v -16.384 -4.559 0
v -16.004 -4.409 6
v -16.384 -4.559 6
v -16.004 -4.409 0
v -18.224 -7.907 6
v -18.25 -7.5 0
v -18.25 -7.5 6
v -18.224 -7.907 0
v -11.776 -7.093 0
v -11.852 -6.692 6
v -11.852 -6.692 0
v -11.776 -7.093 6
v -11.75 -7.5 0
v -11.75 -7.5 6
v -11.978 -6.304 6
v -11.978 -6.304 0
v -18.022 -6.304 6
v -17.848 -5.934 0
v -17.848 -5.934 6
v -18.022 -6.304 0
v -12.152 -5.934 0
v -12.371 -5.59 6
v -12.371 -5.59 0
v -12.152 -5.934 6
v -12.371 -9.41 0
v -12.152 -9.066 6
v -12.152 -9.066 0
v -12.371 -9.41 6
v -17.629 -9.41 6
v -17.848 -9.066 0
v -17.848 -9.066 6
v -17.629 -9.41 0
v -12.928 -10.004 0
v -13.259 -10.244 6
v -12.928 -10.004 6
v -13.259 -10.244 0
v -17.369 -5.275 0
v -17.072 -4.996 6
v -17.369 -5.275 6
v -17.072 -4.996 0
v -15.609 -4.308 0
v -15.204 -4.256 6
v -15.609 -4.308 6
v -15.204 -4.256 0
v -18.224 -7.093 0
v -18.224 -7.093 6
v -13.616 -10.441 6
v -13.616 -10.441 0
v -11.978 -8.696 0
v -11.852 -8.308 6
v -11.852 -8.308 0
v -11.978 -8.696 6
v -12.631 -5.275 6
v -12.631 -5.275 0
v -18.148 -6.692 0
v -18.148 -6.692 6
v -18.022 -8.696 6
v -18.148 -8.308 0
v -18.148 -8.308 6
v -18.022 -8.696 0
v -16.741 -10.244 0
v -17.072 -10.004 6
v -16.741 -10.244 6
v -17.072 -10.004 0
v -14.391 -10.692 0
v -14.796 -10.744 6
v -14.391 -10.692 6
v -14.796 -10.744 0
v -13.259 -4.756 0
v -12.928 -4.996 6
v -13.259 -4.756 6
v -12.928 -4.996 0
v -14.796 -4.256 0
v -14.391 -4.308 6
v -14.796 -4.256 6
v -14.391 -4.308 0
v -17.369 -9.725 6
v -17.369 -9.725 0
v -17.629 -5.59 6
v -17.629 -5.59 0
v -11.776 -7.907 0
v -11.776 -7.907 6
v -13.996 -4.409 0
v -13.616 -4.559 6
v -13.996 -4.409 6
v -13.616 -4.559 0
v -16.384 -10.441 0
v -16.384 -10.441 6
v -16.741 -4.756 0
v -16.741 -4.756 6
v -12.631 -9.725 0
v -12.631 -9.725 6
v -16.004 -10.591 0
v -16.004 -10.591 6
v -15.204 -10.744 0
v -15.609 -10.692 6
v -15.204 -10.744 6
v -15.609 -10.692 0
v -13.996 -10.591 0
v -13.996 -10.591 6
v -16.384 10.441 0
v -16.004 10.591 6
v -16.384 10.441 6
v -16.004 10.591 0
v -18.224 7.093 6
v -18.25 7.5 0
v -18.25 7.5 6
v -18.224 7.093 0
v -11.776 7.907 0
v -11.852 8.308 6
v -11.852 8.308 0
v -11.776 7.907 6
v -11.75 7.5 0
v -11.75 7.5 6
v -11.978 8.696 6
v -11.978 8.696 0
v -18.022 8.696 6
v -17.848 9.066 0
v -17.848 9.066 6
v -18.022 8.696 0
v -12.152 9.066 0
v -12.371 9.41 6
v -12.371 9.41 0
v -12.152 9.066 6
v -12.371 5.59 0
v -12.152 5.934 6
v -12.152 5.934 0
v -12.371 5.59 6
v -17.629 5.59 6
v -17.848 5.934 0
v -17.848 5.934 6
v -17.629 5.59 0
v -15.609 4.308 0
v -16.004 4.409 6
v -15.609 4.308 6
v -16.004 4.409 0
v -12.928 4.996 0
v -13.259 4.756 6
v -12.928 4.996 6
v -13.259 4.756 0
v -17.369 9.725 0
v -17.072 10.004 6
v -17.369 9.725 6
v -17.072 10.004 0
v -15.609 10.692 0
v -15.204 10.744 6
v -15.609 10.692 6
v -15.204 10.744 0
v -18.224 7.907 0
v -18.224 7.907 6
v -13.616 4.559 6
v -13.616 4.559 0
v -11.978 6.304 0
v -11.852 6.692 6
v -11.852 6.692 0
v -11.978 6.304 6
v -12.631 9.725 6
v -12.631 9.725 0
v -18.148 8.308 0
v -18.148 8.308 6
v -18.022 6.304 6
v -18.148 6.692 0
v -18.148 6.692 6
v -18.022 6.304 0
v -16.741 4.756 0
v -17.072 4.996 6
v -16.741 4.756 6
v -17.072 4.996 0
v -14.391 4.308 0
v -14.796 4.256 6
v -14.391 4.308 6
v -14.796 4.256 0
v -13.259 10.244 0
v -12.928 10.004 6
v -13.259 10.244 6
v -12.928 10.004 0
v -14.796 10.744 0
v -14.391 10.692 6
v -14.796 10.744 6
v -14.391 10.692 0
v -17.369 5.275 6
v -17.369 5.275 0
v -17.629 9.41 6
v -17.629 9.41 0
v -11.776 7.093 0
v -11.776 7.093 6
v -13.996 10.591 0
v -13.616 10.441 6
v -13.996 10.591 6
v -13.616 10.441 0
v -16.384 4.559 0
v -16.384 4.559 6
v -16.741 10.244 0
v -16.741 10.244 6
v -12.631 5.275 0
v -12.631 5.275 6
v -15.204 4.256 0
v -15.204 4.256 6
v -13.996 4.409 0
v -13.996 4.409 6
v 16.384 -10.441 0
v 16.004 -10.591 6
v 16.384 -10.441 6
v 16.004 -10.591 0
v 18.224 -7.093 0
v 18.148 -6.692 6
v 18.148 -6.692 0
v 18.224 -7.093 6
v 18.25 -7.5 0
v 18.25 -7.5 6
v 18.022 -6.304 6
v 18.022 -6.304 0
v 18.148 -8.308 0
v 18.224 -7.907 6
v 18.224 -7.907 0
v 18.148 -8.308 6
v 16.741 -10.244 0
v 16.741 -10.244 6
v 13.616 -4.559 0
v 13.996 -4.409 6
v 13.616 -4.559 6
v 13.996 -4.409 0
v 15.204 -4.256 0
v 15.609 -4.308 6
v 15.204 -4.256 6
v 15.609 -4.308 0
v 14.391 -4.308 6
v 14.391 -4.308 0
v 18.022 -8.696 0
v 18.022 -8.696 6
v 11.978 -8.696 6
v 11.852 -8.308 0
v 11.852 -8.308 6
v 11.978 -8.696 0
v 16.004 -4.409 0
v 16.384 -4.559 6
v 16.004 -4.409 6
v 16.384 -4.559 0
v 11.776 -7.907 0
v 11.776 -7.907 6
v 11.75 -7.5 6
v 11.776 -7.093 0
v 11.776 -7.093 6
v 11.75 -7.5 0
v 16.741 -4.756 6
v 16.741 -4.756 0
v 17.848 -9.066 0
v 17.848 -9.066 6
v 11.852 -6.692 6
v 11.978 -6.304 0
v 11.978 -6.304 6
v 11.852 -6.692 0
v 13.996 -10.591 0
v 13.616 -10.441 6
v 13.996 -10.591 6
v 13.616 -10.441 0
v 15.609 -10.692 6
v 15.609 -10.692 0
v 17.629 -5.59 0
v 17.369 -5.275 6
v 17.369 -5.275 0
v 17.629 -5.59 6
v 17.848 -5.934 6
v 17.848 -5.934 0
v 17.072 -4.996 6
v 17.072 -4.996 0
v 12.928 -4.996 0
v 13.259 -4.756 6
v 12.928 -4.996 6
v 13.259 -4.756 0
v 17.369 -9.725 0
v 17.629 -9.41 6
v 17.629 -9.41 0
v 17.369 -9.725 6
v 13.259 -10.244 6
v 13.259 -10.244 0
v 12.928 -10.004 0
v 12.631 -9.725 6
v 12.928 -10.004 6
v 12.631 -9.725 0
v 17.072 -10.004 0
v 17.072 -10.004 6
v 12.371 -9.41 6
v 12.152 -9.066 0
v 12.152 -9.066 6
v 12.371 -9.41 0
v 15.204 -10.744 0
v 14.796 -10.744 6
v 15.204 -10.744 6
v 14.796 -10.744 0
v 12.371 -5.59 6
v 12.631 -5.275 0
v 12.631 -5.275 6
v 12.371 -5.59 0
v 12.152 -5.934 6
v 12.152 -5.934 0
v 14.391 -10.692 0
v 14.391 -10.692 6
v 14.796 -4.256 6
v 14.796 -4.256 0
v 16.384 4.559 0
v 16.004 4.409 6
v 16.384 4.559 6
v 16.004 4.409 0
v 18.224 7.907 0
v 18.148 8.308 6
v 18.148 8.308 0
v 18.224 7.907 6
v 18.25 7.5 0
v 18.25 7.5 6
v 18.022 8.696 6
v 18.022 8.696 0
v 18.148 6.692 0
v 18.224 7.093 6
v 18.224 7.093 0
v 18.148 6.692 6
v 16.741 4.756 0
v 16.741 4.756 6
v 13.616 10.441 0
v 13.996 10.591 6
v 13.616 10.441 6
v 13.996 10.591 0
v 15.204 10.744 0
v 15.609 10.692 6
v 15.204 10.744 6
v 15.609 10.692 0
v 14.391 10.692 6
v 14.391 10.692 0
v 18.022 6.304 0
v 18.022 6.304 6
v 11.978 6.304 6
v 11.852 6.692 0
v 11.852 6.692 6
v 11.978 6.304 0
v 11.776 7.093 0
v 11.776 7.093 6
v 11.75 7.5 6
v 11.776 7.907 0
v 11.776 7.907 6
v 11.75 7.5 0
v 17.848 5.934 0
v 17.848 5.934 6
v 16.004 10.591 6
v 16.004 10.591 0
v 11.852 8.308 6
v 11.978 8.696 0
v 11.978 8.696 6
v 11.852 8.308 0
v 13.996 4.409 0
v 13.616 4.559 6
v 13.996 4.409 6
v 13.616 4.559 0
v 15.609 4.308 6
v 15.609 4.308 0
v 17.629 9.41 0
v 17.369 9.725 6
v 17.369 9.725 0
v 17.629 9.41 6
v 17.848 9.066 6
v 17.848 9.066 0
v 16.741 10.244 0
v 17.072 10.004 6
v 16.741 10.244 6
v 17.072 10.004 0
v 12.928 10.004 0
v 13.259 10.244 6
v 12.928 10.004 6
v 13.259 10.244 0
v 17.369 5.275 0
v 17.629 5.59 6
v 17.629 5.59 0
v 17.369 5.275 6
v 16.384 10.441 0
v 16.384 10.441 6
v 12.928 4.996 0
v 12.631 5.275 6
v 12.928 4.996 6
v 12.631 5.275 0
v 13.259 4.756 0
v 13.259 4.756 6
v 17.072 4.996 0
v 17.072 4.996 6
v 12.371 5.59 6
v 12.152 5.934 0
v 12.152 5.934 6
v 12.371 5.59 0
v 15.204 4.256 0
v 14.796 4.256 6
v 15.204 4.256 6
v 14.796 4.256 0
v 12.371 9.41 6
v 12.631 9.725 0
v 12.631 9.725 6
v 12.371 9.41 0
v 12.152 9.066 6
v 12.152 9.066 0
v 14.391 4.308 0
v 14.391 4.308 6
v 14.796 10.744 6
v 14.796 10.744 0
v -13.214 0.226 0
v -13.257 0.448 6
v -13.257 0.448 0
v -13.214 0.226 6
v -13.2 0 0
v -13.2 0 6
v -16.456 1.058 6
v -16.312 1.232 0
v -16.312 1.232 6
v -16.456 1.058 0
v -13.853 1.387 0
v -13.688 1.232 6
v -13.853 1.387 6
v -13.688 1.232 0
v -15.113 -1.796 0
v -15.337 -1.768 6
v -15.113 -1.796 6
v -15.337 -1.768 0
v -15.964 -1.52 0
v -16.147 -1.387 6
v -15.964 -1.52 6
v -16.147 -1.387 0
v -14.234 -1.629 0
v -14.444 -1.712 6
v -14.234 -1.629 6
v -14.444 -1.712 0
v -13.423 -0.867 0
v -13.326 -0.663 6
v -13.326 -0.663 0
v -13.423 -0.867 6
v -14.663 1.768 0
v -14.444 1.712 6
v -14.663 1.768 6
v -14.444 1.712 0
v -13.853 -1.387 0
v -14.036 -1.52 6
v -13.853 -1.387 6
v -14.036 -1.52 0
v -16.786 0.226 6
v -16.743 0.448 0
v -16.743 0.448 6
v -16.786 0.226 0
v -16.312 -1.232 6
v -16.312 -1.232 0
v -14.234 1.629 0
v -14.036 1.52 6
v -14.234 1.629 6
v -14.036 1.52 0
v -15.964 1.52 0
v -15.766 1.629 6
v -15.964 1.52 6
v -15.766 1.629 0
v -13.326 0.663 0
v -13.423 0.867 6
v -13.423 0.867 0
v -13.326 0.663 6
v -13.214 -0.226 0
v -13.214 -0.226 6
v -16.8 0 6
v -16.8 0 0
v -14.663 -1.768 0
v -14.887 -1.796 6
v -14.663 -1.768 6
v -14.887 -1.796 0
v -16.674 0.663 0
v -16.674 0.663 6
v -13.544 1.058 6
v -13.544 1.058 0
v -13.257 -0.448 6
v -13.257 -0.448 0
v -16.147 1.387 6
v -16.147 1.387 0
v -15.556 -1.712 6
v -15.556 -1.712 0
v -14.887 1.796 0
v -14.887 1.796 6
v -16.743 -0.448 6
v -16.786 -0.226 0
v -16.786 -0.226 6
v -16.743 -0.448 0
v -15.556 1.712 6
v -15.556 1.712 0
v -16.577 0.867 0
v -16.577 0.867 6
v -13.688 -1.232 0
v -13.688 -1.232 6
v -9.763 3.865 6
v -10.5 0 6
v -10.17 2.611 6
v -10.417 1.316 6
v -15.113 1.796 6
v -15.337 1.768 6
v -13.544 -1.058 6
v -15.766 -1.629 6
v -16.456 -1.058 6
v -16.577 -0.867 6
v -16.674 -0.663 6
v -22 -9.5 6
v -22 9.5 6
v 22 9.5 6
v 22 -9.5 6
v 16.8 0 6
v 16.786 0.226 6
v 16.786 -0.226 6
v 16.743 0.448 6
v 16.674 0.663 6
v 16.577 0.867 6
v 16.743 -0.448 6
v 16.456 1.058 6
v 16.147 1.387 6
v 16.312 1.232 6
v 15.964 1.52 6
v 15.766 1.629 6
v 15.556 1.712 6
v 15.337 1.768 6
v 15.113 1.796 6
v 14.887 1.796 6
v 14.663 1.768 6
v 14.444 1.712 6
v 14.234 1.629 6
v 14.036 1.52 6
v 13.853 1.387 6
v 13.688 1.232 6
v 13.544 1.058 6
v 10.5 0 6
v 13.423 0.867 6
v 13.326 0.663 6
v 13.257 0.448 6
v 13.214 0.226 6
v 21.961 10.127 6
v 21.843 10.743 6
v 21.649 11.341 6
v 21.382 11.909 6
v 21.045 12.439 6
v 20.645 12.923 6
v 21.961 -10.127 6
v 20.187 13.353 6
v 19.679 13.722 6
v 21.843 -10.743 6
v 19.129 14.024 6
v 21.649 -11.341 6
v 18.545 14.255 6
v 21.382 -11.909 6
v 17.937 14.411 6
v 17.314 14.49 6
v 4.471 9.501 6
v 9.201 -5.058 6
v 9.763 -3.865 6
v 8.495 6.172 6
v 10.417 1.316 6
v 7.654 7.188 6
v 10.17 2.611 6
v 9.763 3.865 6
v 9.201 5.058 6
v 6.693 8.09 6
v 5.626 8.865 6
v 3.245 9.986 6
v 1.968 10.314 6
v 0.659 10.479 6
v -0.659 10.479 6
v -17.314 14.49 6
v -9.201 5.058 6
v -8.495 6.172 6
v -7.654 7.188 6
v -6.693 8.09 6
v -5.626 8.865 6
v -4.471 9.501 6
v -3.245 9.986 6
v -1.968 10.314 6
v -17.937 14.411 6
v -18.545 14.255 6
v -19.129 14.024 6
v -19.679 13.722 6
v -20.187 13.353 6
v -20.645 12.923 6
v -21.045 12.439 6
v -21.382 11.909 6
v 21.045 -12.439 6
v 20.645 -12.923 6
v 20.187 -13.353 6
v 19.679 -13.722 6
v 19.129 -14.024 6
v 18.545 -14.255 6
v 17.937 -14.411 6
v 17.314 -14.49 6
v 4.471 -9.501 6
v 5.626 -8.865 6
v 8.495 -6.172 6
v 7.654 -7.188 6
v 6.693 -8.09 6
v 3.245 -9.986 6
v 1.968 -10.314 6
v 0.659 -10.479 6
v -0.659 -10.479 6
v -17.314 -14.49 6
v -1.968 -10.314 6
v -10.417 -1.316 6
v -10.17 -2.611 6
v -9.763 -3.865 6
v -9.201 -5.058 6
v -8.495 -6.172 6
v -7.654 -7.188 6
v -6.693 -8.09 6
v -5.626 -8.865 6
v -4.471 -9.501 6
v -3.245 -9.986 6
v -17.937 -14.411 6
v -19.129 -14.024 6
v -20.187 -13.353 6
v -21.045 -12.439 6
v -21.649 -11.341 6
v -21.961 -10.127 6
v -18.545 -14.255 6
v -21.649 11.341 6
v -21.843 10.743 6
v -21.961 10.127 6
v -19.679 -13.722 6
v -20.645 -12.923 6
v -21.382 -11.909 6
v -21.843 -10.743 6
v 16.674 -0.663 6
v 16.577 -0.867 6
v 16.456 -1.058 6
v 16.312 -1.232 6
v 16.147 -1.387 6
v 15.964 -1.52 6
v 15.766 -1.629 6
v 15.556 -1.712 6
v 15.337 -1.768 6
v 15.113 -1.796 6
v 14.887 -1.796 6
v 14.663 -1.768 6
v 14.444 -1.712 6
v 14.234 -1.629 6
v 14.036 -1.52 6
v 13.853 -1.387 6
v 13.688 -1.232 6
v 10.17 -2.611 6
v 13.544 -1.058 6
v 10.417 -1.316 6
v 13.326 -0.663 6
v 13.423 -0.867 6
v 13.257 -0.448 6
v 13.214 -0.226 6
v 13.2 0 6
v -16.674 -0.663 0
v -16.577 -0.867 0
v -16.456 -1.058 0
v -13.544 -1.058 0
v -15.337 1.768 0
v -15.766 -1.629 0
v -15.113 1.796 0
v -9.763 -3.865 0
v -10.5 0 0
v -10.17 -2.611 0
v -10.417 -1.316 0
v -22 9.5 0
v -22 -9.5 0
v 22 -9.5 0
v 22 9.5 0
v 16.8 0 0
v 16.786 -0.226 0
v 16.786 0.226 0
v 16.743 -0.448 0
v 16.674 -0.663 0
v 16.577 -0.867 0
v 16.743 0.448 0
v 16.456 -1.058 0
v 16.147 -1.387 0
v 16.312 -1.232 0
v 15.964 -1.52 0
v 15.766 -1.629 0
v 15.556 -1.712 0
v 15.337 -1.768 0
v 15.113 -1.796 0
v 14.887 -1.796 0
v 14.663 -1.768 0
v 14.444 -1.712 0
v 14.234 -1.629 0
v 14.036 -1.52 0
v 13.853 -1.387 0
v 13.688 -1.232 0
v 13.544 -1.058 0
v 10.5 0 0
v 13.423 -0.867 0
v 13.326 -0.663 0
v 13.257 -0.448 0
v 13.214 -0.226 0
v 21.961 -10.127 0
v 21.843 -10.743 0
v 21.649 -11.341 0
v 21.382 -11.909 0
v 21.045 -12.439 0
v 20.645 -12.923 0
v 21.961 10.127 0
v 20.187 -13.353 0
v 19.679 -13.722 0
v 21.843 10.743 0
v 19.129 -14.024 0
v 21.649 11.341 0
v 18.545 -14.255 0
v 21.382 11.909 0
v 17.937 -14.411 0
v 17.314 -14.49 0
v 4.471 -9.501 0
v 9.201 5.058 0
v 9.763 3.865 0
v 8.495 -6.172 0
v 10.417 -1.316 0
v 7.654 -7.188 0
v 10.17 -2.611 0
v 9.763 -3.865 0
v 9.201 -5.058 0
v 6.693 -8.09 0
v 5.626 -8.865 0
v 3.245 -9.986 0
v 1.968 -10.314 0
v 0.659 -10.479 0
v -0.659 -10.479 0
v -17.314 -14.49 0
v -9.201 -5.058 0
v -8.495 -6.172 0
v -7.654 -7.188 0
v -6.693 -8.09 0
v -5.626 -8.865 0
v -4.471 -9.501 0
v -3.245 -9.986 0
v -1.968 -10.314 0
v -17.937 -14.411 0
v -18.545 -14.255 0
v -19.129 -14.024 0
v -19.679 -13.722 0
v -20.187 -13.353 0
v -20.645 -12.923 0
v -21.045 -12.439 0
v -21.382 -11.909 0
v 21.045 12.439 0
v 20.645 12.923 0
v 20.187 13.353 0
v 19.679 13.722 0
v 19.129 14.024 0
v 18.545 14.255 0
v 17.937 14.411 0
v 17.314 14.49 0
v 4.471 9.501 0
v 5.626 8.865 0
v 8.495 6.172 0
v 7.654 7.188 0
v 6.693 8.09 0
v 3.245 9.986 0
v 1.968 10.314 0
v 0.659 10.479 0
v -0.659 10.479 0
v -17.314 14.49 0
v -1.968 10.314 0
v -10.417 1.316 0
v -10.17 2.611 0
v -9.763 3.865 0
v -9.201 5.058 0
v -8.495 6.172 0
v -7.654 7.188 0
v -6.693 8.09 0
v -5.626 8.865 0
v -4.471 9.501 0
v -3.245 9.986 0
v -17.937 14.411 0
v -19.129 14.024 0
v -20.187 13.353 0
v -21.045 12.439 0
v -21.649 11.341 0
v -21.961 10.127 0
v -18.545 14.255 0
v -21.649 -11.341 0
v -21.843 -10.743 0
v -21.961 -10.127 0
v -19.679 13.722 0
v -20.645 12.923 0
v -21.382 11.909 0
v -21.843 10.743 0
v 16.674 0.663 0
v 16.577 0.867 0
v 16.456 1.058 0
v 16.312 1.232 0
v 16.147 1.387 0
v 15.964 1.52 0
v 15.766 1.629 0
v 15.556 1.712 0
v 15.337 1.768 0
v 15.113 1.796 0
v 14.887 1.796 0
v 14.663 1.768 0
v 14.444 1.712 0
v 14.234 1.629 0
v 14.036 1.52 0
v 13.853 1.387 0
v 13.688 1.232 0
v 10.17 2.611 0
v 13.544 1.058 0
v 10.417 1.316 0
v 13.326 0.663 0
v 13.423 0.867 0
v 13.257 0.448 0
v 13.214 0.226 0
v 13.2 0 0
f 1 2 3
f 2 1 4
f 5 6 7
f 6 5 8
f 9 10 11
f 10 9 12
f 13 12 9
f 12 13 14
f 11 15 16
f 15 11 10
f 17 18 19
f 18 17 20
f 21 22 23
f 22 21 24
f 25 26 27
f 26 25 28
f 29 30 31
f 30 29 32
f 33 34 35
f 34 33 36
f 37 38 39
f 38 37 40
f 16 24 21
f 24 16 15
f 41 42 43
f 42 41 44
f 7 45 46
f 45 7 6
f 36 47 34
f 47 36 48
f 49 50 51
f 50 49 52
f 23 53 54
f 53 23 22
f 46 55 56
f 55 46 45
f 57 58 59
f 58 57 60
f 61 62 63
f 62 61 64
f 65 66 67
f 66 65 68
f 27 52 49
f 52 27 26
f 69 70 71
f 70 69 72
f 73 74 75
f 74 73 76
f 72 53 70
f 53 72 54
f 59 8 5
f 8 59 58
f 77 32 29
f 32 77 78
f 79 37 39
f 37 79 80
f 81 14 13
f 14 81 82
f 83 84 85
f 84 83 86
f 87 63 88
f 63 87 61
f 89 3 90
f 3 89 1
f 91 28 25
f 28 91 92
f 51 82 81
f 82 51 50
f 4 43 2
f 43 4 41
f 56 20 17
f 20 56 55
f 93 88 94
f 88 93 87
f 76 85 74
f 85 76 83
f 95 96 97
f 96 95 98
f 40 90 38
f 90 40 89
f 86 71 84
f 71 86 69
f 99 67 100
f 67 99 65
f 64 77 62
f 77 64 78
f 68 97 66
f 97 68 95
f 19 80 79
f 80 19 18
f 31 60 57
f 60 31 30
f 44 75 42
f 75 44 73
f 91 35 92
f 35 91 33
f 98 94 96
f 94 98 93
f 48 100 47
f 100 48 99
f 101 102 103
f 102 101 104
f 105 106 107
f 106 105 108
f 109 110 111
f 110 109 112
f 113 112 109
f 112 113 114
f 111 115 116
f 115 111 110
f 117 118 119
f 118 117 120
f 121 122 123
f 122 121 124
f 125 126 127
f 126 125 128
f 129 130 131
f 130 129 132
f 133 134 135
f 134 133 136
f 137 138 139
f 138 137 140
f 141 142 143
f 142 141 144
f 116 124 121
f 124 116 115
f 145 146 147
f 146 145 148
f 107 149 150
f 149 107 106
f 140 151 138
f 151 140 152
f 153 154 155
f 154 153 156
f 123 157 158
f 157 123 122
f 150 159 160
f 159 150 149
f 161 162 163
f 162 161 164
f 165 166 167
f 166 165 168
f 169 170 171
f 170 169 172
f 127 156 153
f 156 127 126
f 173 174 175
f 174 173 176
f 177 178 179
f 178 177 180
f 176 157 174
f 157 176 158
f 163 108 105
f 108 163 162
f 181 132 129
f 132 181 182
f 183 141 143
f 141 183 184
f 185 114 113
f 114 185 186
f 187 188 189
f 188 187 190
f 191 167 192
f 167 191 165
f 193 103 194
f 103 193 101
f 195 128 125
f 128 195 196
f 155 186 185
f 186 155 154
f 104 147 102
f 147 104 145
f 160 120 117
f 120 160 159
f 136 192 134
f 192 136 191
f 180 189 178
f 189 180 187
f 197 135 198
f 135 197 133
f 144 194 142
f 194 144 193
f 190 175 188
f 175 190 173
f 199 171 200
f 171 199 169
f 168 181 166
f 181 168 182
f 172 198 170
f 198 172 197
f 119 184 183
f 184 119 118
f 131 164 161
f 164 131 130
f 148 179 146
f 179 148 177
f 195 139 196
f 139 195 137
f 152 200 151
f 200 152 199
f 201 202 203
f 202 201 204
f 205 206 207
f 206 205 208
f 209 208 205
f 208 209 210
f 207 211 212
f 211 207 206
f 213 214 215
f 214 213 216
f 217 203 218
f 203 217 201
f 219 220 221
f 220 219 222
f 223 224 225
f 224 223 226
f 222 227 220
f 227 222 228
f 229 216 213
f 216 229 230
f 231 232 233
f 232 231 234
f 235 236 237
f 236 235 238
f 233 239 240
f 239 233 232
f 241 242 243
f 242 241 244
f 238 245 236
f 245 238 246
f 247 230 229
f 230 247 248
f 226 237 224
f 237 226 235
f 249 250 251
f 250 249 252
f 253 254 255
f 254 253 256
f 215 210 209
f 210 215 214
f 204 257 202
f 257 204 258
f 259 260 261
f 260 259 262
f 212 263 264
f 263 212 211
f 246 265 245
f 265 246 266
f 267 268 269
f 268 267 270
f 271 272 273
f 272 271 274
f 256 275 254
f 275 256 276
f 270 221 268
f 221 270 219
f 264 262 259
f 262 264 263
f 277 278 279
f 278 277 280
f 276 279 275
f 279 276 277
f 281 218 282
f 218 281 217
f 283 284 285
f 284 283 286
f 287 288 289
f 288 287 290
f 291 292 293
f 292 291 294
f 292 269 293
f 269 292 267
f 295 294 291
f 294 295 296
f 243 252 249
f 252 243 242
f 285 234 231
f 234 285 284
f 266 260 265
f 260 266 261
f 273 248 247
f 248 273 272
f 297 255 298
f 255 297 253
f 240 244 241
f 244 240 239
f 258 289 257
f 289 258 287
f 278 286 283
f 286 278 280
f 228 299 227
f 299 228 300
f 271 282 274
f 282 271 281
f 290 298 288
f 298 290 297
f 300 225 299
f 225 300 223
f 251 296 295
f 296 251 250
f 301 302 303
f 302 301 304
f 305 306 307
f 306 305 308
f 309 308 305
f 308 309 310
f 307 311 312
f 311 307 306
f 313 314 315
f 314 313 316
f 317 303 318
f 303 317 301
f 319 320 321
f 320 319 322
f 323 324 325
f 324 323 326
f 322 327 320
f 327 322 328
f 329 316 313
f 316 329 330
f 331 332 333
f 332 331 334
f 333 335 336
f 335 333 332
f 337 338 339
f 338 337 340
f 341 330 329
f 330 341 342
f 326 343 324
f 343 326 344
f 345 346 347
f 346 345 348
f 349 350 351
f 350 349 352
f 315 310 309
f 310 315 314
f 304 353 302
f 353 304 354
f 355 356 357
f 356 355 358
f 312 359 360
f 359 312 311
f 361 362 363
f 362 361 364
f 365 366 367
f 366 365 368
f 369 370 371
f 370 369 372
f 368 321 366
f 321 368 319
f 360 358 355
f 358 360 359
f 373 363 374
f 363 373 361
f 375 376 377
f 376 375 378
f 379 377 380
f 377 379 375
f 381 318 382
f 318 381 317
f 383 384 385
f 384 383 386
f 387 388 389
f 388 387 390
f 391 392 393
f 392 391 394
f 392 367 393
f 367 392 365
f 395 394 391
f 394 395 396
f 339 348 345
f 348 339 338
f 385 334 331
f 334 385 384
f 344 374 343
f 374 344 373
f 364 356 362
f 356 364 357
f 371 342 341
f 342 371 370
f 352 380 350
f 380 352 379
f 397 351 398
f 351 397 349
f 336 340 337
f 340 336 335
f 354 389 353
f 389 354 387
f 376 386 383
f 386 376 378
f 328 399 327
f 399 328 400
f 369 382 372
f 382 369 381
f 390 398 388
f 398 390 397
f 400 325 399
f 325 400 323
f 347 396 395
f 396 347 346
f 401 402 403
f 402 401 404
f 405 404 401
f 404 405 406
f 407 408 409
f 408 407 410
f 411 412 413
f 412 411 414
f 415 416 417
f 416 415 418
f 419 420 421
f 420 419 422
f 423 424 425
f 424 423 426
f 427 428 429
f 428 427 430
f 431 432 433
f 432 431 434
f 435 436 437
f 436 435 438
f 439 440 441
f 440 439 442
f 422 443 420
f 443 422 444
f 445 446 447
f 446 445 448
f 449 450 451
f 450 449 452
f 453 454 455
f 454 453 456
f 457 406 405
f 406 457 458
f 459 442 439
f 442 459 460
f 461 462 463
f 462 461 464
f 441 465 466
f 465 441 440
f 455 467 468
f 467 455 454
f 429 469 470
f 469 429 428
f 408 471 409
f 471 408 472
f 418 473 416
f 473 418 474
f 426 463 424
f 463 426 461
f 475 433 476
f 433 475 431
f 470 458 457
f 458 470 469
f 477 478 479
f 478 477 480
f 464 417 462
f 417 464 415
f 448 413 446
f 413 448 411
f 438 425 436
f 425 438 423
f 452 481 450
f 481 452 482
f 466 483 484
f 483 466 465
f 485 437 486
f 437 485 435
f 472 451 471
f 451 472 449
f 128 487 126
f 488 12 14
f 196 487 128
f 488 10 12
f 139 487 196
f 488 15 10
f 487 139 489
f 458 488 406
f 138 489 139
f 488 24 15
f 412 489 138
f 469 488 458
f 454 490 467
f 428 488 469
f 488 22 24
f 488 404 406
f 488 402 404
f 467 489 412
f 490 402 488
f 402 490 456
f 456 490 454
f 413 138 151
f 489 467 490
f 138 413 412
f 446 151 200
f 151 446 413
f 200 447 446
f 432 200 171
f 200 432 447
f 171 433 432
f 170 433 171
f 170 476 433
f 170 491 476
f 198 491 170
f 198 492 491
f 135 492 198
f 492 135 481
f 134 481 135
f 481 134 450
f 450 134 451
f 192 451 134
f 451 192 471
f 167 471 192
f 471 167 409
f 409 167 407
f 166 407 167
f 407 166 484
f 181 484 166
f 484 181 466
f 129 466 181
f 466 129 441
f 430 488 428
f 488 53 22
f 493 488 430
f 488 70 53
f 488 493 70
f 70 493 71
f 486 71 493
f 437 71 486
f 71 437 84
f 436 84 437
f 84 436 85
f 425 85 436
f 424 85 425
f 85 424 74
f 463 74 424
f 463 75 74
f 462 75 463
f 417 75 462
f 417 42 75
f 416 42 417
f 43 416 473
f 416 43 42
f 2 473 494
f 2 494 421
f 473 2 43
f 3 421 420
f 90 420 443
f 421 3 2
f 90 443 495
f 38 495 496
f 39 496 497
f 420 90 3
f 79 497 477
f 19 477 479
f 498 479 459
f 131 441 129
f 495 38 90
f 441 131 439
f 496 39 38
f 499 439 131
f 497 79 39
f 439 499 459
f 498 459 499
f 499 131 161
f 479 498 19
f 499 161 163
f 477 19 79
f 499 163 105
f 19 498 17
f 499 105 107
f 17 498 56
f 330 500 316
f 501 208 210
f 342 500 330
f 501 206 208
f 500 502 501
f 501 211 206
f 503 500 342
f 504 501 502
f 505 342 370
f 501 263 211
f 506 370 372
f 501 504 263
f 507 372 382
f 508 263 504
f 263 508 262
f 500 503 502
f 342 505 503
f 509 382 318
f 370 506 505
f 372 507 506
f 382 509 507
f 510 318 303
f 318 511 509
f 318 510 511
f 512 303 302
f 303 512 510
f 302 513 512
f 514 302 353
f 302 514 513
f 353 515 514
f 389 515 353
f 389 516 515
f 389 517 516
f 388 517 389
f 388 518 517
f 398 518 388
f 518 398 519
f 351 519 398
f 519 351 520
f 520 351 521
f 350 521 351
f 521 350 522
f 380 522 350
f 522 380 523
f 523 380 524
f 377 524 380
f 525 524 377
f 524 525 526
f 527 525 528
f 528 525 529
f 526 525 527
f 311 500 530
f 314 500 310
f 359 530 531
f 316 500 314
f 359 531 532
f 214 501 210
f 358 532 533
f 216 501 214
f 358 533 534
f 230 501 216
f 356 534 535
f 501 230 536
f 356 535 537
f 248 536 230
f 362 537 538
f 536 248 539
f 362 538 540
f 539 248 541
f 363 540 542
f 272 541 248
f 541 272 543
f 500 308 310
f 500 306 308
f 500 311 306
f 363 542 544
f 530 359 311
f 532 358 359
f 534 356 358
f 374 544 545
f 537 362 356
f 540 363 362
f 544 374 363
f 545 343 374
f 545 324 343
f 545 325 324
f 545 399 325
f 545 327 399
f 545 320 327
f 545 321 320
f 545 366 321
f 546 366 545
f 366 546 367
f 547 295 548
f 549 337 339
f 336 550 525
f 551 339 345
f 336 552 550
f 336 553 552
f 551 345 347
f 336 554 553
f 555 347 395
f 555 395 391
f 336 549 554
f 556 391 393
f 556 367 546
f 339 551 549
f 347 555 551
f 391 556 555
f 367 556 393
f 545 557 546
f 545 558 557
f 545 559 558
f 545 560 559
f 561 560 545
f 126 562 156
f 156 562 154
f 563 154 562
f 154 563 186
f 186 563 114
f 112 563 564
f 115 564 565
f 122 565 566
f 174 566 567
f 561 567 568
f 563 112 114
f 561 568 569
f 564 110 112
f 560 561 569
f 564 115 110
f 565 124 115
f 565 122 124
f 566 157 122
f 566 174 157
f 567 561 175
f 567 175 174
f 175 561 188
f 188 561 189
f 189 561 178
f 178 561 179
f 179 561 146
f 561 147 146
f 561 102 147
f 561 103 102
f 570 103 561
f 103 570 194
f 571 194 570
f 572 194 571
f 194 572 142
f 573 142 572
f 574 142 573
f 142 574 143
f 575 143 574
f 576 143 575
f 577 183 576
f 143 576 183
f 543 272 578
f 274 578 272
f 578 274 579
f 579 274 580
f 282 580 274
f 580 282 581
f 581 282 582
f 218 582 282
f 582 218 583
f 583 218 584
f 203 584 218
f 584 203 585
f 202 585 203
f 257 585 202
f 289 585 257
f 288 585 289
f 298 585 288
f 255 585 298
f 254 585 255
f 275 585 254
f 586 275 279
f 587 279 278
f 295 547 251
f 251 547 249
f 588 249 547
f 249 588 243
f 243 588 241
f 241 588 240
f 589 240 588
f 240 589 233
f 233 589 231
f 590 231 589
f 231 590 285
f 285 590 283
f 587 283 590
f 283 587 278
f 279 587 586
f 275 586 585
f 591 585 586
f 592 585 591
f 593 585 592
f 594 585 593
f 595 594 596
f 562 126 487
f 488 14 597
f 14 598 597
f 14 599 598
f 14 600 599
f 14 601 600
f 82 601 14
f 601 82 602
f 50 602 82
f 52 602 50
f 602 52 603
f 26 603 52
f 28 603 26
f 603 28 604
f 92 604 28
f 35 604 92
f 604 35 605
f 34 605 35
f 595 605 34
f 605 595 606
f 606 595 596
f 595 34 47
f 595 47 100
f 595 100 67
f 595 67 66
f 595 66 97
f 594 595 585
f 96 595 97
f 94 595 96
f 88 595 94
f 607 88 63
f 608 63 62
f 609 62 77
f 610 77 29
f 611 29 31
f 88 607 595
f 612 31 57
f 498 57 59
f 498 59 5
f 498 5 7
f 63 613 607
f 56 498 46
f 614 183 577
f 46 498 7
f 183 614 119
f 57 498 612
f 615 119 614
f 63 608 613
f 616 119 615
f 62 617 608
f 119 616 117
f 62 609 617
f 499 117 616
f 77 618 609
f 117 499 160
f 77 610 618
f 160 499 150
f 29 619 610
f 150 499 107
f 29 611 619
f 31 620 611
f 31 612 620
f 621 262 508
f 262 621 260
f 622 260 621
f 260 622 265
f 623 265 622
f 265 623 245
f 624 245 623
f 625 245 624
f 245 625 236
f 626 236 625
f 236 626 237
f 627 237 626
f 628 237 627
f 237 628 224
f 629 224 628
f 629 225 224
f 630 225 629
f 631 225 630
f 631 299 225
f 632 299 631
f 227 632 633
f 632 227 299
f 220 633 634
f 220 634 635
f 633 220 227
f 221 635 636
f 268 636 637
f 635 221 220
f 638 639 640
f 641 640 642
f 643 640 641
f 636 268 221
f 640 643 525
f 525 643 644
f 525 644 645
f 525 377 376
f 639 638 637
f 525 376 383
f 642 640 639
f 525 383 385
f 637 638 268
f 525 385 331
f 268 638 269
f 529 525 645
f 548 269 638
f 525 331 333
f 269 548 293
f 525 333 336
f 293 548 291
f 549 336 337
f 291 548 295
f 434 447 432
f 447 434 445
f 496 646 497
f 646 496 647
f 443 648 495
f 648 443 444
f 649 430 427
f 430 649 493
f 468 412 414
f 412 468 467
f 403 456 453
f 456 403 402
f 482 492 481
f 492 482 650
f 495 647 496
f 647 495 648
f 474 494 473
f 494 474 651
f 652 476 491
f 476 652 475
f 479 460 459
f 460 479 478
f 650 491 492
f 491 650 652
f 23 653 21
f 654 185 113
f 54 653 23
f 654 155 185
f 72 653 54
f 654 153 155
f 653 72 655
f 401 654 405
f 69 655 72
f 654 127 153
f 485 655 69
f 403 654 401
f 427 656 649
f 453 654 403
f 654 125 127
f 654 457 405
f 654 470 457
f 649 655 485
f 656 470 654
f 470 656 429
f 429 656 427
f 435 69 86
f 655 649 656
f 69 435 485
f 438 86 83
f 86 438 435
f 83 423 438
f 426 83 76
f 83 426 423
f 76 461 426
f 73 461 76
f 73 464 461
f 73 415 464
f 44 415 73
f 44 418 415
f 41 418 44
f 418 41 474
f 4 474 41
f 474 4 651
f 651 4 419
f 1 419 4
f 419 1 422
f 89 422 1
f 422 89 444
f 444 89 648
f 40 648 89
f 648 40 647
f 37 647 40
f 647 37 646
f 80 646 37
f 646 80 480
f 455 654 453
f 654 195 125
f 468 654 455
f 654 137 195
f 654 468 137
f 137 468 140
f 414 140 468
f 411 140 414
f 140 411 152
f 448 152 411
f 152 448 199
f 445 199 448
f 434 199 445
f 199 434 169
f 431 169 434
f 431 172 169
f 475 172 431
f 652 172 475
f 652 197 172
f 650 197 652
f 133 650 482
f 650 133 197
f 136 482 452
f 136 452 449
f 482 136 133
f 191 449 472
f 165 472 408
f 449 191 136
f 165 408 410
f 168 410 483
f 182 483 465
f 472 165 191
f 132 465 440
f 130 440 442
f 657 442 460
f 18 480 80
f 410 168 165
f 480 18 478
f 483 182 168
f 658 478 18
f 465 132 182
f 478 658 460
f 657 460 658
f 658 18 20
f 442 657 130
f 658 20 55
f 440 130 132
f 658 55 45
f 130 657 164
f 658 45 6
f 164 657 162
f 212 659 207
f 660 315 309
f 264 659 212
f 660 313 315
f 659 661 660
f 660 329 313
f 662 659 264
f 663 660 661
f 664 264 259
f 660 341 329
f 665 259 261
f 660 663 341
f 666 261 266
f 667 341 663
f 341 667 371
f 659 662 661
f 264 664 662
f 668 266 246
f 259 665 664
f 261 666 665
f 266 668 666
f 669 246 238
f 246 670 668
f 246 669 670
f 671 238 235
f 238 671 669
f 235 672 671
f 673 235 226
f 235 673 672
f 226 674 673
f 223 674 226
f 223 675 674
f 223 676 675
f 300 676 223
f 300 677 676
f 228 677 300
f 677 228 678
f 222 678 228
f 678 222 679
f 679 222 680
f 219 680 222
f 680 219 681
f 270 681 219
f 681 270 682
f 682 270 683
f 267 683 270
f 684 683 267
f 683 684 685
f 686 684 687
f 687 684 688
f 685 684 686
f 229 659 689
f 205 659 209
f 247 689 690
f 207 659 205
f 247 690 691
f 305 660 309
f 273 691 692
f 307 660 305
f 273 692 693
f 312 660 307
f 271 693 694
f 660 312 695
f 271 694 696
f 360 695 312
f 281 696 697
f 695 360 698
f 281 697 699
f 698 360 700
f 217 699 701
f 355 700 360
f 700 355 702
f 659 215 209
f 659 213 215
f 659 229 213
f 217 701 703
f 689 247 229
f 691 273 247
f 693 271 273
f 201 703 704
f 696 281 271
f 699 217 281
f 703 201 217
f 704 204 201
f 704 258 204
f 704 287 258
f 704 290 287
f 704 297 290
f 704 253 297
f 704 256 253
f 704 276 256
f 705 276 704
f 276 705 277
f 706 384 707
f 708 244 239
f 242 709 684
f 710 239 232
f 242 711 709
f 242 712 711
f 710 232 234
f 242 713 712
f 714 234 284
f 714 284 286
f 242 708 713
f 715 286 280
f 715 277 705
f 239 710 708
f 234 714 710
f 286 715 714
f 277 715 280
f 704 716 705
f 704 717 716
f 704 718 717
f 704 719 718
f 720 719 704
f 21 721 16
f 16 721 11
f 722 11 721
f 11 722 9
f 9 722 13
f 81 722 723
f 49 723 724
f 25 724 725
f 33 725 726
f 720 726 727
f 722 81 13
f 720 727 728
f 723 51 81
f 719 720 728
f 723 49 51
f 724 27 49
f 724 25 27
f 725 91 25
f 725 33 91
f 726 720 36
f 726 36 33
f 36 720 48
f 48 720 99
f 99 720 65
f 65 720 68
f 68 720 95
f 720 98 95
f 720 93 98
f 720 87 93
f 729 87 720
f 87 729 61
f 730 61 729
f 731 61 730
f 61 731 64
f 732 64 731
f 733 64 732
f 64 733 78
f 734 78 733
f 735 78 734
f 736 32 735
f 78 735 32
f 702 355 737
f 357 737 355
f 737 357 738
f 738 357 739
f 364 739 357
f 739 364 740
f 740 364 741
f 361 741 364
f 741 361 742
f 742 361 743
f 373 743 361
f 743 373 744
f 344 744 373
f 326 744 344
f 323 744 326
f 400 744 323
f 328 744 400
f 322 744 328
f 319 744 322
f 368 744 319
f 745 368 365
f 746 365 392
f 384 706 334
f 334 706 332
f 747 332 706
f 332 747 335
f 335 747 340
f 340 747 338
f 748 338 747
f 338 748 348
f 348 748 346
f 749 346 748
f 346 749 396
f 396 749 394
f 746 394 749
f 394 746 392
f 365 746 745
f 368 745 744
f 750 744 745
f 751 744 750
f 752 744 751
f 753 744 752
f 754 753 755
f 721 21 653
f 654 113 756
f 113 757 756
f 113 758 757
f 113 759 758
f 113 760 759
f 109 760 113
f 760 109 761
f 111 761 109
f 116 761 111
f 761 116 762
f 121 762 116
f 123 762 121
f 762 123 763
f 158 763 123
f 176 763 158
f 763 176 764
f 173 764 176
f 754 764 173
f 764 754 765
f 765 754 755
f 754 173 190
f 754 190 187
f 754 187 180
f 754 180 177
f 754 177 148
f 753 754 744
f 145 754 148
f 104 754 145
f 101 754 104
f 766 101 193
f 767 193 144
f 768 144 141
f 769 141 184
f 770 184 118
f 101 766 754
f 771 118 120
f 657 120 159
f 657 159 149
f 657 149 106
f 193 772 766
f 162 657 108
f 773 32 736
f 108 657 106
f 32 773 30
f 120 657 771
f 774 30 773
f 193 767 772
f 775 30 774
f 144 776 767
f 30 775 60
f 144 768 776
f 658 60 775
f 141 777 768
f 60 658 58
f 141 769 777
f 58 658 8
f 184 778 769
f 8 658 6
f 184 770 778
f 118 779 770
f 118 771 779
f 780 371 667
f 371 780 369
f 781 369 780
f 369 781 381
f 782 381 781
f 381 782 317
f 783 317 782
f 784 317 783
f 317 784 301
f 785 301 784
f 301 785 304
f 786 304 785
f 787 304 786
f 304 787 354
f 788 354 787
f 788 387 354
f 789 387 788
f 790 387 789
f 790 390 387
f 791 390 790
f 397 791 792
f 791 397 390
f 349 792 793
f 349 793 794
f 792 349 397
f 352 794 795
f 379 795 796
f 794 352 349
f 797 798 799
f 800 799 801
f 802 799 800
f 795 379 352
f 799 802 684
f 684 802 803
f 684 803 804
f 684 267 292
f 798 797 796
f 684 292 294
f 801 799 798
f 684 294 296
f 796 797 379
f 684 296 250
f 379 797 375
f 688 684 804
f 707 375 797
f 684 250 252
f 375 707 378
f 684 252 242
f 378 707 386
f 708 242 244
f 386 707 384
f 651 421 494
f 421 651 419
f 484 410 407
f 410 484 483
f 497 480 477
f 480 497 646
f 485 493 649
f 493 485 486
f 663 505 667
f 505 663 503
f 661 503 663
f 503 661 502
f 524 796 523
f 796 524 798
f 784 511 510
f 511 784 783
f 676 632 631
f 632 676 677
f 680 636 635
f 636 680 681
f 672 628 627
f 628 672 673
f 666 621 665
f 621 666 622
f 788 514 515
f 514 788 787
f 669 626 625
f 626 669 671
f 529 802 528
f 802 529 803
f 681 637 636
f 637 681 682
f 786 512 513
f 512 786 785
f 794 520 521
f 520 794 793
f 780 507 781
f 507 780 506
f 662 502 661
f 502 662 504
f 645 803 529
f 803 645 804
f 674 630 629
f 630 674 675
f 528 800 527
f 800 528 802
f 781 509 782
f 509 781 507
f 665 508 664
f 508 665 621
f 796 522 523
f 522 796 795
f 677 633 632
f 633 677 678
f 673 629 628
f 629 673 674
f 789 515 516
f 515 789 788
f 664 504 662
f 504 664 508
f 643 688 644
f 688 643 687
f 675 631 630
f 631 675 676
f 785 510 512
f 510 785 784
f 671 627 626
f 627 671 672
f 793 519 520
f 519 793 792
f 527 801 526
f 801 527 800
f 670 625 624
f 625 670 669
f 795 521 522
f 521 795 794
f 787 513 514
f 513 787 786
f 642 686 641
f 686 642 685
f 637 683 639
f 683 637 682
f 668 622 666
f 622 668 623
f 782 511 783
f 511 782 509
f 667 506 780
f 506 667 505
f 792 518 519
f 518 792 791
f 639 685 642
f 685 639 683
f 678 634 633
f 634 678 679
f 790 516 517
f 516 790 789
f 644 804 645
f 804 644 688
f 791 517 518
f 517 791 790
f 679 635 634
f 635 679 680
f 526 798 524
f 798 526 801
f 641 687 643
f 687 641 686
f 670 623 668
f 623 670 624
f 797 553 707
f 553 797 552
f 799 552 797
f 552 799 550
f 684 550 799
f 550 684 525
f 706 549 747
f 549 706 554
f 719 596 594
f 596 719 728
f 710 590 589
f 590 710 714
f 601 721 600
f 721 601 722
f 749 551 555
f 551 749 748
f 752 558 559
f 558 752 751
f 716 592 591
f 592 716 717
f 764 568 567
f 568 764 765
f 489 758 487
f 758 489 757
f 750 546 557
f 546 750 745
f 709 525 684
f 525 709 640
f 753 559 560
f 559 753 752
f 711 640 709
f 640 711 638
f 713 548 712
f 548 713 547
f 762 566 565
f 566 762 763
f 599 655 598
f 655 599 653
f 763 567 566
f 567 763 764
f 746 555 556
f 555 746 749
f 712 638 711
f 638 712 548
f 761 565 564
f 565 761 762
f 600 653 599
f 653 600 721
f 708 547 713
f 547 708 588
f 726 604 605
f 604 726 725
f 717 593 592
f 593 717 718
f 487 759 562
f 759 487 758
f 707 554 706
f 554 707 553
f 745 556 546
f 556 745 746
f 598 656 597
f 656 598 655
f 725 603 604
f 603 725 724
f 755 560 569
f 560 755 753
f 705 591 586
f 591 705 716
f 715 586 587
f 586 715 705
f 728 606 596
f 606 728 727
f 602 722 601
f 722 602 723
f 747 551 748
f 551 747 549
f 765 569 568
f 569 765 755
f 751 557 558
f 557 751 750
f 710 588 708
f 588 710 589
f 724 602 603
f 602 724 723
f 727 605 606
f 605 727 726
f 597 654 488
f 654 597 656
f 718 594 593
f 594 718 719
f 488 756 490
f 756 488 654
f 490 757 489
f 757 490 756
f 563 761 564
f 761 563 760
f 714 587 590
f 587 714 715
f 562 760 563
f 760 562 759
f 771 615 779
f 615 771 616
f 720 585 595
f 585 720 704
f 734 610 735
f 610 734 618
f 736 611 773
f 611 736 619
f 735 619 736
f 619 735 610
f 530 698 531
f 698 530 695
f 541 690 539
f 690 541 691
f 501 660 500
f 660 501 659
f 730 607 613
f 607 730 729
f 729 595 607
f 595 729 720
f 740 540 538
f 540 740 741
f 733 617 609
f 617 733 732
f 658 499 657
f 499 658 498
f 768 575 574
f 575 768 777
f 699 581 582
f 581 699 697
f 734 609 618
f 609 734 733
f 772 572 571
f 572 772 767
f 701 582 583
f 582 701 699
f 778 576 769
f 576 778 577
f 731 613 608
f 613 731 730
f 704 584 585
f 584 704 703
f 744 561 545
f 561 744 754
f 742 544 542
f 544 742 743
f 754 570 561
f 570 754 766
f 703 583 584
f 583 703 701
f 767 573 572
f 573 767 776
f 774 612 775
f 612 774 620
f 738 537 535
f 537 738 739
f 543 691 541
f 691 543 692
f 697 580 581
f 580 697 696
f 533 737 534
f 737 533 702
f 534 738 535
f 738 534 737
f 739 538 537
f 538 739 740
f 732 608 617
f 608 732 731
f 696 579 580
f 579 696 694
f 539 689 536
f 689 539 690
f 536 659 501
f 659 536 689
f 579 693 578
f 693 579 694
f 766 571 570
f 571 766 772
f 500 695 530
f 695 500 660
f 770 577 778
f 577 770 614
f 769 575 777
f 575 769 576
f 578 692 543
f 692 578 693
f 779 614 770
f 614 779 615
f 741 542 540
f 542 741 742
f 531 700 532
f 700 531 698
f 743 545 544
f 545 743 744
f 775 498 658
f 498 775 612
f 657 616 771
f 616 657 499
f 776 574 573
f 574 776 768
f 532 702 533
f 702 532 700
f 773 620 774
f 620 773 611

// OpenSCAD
$fn = 50;


difference() {
	union() {
		hull() {
			translate(v = [-17.0000000000, 9.5000000000, 0]) {
				cylinder(h = 6, r = 5);
			}
			translate(v = [17.0000000000, 9.5000000000, 0]) {
				cylinder(h = 6, r = 5);
			}
			translate(v = [-17.0000000000, -9.5000000000, 0]) {
				cylinder(h = 6, r = 5);
			}
			translate(v = [17.0000000000, -9.5000000000, 0]) {
				cylinder(h = 6, r = 5);
			}
		}
	}
	union() {
		#translate(v = [-15.0000000000, -7.5000000000, 0]) {
			cylinder(h = 6, r = 3.2500000000);
		}
		#translate(v = [-15.0000000000, 7.5000000000, 0]) {
			cylinder(h = 6, r = 3.2500000000);
		}
		#translate(v = [15.0000000000, -7.5000000000, 0]) {
			cylinder(h = 6, r = 3.2500000000);
		}
		#translate(v = [15.0000000000, 7.5000000000, 0]) {
			cylinder(h = 6, r = 3.2500000000);
		}
		#translate(v = [-15.0000000000, -7.5000000000, -100.0000000000]) {
			cylinder(h = 200, r = 3.2500000000);
		}
		#translate(v = [-15.0000000000, 7.5000000000, -100.0000000000]) {
			cylinder(h = 200, r = 3.2500000000);
		}
		#translate(v = [15.0000000000, -7.5000000000, -100.0000000000]) {
			cylinder(h = 200, r = 3.2500000000);
		}
		#translate(v = [15.0000000000, 7.5000000000, -100.0000000000]) {
			cylinder(h = 200, r = 3.2500000000);
		}
		#translate(v = [-15.0000000000, -7.5000000000, 0]) {
			cylinder(h = 6, r = 1.8000000000);
		}
		#translate(v = [-15.0000000000, 0.0000000000, 0]) {
			cylinder(h = 6, r = 1.8000000000);
		}
		#translate(v = [-15.0000000000, 7.5000000000, 0]) {
			cylinder(h = 6, r = 1.8000000000);
		}
		#translate(v = [15.0000000000, -7.5000000000, 0]) {
			cylinder(h = 6, r = 1.8000000000);
		}
		#translate(v = [15.0000000000, 0.0000000000, 0]) {
			cylinder(h = 6, r = 1.8000000000);
		}
		#translate(v = [15.0000000000, 7.5000000000, 0]) {
			cylinder(h = 6, r = 1.8000000000);
		}
		#translate(v = [-15.0000000000, -7.5000000000, 0]) {
			cylinder(h = 6, r = 1.8000000000);
		}
		#translate(v = [-15.0000000000, 0.0000000000, 0]) {
			cylinder(h = 6, r = 1.8000000000);
		}
		#translate(v = [-15.0000000000, 7.5000000000, 0]) {
			cylinder(h = 6, r = 1.8000000000);
		}
		#translate(v = [15.0000000000, -7.5000000000, 0]) {
			cylinder(h = 6, r = 1.8000000000);
		}
		#translate(v = [15.0000000000, 0.0000000000, 0]) {
			cylinder(h = 6, r = 1.8000000000);
		}
		#translate(v = [15.0000000000, 7.5000000000, 0]) {
			cylinder(h = 6, r = 1.8000000000);
		}
		#translate(v = [-15.0000000000, -7.5000000000, 0]) {
			cylinder(h = 6, r = 1.8000000000);
		}
		#translate(v = [-15.0000000000, 0.0000000000, 0]) {
			cylinder(h = 6, r = 1.8000000000);
		}
		#translate(v = [-15.0000000000, 7.5000000000, 0]) {
			cylinder(h = 6, r = 1.8000000000);
		}
		#translate(v = [15.0000000000, -7.5000000000, 0]) {
			cylinder(h = 6, r = 1.8000000000);
		}
		#translate(v = [15.0000000000, 0.0000000000, 0]) {
			cylinder(h = 6, r = 1.8000000000);
		}
		#translate(v = [15.0000000000, 7.5000000000, 0]) {
			cylinder(h = 6, r = 1.8000000000);
		}
		#cylinder(h = 6, r = 10.5000000000);
	}
}
